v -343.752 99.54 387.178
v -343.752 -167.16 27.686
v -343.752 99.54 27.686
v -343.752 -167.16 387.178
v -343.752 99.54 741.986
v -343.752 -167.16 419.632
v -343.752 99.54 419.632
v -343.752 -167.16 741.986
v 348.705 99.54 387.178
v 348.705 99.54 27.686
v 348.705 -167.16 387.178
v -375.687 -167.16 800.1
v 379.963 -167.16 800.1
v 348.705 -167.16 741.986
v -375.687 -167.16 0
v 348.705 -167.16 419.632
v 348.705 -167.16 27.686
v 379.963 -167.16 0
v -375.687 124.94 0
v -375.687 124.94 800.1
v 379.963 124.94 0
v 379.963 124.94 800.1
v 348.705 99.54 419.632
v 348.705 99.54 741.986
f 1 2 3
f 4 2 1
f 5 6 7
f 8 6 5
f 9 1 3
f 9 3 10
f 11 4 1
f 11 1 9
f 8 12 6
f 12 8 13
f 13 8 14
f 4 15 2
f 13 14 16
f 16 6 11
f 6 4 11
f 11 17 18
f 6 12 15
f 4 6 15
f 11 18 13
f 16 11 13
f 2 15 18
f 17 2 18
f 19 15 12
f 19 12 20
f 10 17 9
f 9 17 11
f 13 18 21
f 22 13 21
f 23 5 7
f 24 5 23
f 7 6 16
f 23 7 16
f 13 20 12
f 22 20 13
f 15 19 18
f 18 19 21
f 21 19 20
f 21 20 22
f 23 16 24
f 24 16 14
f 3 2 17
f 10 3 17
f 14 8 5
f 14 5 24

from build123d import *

# Parameters (mm, degrees)
F0_W     = 755.65
F0_H     = 292.1
F1_DEPTH = 800.1
F2_W     = 692.456603
F2_H     = 359.491945
F3_DEPTH = 266.7
F4_W     = 692.456603
F4_H     = 322.354048
F5_DEPTH = 266.7


with BuildPart() as f1:
    # F0 (on Top) → F1 (new body)
    with BuildSketch(Plane.XY):
        with Locations((2.138129, -21.109734)):
            Rectangle(F0_W, F0_H)
    extrude(amount=F1_DEPTH)

    # F2 (on face) → F3 (cut)
    with BuildSketch(Plane.XZ.offset(167.159734)):
        with Locations((2.476693, 207.432329)):
            Rectangle(F2_W, F2_H)
    extrude(amount=-F3_DEPTH, mode=Mode.SUBTRACT)

    # F4 (on face) → F5 (cut)
    with BuildSketch(Plane.XZ.offset(167.159734)):
        with Locations((2.476693, 580.808595)):
            Rectangle(F4_W, F4_H)
    extrude(amount=-F5_DEPTH, mode=Mode.SUBTRACT)


solid = f1.part
